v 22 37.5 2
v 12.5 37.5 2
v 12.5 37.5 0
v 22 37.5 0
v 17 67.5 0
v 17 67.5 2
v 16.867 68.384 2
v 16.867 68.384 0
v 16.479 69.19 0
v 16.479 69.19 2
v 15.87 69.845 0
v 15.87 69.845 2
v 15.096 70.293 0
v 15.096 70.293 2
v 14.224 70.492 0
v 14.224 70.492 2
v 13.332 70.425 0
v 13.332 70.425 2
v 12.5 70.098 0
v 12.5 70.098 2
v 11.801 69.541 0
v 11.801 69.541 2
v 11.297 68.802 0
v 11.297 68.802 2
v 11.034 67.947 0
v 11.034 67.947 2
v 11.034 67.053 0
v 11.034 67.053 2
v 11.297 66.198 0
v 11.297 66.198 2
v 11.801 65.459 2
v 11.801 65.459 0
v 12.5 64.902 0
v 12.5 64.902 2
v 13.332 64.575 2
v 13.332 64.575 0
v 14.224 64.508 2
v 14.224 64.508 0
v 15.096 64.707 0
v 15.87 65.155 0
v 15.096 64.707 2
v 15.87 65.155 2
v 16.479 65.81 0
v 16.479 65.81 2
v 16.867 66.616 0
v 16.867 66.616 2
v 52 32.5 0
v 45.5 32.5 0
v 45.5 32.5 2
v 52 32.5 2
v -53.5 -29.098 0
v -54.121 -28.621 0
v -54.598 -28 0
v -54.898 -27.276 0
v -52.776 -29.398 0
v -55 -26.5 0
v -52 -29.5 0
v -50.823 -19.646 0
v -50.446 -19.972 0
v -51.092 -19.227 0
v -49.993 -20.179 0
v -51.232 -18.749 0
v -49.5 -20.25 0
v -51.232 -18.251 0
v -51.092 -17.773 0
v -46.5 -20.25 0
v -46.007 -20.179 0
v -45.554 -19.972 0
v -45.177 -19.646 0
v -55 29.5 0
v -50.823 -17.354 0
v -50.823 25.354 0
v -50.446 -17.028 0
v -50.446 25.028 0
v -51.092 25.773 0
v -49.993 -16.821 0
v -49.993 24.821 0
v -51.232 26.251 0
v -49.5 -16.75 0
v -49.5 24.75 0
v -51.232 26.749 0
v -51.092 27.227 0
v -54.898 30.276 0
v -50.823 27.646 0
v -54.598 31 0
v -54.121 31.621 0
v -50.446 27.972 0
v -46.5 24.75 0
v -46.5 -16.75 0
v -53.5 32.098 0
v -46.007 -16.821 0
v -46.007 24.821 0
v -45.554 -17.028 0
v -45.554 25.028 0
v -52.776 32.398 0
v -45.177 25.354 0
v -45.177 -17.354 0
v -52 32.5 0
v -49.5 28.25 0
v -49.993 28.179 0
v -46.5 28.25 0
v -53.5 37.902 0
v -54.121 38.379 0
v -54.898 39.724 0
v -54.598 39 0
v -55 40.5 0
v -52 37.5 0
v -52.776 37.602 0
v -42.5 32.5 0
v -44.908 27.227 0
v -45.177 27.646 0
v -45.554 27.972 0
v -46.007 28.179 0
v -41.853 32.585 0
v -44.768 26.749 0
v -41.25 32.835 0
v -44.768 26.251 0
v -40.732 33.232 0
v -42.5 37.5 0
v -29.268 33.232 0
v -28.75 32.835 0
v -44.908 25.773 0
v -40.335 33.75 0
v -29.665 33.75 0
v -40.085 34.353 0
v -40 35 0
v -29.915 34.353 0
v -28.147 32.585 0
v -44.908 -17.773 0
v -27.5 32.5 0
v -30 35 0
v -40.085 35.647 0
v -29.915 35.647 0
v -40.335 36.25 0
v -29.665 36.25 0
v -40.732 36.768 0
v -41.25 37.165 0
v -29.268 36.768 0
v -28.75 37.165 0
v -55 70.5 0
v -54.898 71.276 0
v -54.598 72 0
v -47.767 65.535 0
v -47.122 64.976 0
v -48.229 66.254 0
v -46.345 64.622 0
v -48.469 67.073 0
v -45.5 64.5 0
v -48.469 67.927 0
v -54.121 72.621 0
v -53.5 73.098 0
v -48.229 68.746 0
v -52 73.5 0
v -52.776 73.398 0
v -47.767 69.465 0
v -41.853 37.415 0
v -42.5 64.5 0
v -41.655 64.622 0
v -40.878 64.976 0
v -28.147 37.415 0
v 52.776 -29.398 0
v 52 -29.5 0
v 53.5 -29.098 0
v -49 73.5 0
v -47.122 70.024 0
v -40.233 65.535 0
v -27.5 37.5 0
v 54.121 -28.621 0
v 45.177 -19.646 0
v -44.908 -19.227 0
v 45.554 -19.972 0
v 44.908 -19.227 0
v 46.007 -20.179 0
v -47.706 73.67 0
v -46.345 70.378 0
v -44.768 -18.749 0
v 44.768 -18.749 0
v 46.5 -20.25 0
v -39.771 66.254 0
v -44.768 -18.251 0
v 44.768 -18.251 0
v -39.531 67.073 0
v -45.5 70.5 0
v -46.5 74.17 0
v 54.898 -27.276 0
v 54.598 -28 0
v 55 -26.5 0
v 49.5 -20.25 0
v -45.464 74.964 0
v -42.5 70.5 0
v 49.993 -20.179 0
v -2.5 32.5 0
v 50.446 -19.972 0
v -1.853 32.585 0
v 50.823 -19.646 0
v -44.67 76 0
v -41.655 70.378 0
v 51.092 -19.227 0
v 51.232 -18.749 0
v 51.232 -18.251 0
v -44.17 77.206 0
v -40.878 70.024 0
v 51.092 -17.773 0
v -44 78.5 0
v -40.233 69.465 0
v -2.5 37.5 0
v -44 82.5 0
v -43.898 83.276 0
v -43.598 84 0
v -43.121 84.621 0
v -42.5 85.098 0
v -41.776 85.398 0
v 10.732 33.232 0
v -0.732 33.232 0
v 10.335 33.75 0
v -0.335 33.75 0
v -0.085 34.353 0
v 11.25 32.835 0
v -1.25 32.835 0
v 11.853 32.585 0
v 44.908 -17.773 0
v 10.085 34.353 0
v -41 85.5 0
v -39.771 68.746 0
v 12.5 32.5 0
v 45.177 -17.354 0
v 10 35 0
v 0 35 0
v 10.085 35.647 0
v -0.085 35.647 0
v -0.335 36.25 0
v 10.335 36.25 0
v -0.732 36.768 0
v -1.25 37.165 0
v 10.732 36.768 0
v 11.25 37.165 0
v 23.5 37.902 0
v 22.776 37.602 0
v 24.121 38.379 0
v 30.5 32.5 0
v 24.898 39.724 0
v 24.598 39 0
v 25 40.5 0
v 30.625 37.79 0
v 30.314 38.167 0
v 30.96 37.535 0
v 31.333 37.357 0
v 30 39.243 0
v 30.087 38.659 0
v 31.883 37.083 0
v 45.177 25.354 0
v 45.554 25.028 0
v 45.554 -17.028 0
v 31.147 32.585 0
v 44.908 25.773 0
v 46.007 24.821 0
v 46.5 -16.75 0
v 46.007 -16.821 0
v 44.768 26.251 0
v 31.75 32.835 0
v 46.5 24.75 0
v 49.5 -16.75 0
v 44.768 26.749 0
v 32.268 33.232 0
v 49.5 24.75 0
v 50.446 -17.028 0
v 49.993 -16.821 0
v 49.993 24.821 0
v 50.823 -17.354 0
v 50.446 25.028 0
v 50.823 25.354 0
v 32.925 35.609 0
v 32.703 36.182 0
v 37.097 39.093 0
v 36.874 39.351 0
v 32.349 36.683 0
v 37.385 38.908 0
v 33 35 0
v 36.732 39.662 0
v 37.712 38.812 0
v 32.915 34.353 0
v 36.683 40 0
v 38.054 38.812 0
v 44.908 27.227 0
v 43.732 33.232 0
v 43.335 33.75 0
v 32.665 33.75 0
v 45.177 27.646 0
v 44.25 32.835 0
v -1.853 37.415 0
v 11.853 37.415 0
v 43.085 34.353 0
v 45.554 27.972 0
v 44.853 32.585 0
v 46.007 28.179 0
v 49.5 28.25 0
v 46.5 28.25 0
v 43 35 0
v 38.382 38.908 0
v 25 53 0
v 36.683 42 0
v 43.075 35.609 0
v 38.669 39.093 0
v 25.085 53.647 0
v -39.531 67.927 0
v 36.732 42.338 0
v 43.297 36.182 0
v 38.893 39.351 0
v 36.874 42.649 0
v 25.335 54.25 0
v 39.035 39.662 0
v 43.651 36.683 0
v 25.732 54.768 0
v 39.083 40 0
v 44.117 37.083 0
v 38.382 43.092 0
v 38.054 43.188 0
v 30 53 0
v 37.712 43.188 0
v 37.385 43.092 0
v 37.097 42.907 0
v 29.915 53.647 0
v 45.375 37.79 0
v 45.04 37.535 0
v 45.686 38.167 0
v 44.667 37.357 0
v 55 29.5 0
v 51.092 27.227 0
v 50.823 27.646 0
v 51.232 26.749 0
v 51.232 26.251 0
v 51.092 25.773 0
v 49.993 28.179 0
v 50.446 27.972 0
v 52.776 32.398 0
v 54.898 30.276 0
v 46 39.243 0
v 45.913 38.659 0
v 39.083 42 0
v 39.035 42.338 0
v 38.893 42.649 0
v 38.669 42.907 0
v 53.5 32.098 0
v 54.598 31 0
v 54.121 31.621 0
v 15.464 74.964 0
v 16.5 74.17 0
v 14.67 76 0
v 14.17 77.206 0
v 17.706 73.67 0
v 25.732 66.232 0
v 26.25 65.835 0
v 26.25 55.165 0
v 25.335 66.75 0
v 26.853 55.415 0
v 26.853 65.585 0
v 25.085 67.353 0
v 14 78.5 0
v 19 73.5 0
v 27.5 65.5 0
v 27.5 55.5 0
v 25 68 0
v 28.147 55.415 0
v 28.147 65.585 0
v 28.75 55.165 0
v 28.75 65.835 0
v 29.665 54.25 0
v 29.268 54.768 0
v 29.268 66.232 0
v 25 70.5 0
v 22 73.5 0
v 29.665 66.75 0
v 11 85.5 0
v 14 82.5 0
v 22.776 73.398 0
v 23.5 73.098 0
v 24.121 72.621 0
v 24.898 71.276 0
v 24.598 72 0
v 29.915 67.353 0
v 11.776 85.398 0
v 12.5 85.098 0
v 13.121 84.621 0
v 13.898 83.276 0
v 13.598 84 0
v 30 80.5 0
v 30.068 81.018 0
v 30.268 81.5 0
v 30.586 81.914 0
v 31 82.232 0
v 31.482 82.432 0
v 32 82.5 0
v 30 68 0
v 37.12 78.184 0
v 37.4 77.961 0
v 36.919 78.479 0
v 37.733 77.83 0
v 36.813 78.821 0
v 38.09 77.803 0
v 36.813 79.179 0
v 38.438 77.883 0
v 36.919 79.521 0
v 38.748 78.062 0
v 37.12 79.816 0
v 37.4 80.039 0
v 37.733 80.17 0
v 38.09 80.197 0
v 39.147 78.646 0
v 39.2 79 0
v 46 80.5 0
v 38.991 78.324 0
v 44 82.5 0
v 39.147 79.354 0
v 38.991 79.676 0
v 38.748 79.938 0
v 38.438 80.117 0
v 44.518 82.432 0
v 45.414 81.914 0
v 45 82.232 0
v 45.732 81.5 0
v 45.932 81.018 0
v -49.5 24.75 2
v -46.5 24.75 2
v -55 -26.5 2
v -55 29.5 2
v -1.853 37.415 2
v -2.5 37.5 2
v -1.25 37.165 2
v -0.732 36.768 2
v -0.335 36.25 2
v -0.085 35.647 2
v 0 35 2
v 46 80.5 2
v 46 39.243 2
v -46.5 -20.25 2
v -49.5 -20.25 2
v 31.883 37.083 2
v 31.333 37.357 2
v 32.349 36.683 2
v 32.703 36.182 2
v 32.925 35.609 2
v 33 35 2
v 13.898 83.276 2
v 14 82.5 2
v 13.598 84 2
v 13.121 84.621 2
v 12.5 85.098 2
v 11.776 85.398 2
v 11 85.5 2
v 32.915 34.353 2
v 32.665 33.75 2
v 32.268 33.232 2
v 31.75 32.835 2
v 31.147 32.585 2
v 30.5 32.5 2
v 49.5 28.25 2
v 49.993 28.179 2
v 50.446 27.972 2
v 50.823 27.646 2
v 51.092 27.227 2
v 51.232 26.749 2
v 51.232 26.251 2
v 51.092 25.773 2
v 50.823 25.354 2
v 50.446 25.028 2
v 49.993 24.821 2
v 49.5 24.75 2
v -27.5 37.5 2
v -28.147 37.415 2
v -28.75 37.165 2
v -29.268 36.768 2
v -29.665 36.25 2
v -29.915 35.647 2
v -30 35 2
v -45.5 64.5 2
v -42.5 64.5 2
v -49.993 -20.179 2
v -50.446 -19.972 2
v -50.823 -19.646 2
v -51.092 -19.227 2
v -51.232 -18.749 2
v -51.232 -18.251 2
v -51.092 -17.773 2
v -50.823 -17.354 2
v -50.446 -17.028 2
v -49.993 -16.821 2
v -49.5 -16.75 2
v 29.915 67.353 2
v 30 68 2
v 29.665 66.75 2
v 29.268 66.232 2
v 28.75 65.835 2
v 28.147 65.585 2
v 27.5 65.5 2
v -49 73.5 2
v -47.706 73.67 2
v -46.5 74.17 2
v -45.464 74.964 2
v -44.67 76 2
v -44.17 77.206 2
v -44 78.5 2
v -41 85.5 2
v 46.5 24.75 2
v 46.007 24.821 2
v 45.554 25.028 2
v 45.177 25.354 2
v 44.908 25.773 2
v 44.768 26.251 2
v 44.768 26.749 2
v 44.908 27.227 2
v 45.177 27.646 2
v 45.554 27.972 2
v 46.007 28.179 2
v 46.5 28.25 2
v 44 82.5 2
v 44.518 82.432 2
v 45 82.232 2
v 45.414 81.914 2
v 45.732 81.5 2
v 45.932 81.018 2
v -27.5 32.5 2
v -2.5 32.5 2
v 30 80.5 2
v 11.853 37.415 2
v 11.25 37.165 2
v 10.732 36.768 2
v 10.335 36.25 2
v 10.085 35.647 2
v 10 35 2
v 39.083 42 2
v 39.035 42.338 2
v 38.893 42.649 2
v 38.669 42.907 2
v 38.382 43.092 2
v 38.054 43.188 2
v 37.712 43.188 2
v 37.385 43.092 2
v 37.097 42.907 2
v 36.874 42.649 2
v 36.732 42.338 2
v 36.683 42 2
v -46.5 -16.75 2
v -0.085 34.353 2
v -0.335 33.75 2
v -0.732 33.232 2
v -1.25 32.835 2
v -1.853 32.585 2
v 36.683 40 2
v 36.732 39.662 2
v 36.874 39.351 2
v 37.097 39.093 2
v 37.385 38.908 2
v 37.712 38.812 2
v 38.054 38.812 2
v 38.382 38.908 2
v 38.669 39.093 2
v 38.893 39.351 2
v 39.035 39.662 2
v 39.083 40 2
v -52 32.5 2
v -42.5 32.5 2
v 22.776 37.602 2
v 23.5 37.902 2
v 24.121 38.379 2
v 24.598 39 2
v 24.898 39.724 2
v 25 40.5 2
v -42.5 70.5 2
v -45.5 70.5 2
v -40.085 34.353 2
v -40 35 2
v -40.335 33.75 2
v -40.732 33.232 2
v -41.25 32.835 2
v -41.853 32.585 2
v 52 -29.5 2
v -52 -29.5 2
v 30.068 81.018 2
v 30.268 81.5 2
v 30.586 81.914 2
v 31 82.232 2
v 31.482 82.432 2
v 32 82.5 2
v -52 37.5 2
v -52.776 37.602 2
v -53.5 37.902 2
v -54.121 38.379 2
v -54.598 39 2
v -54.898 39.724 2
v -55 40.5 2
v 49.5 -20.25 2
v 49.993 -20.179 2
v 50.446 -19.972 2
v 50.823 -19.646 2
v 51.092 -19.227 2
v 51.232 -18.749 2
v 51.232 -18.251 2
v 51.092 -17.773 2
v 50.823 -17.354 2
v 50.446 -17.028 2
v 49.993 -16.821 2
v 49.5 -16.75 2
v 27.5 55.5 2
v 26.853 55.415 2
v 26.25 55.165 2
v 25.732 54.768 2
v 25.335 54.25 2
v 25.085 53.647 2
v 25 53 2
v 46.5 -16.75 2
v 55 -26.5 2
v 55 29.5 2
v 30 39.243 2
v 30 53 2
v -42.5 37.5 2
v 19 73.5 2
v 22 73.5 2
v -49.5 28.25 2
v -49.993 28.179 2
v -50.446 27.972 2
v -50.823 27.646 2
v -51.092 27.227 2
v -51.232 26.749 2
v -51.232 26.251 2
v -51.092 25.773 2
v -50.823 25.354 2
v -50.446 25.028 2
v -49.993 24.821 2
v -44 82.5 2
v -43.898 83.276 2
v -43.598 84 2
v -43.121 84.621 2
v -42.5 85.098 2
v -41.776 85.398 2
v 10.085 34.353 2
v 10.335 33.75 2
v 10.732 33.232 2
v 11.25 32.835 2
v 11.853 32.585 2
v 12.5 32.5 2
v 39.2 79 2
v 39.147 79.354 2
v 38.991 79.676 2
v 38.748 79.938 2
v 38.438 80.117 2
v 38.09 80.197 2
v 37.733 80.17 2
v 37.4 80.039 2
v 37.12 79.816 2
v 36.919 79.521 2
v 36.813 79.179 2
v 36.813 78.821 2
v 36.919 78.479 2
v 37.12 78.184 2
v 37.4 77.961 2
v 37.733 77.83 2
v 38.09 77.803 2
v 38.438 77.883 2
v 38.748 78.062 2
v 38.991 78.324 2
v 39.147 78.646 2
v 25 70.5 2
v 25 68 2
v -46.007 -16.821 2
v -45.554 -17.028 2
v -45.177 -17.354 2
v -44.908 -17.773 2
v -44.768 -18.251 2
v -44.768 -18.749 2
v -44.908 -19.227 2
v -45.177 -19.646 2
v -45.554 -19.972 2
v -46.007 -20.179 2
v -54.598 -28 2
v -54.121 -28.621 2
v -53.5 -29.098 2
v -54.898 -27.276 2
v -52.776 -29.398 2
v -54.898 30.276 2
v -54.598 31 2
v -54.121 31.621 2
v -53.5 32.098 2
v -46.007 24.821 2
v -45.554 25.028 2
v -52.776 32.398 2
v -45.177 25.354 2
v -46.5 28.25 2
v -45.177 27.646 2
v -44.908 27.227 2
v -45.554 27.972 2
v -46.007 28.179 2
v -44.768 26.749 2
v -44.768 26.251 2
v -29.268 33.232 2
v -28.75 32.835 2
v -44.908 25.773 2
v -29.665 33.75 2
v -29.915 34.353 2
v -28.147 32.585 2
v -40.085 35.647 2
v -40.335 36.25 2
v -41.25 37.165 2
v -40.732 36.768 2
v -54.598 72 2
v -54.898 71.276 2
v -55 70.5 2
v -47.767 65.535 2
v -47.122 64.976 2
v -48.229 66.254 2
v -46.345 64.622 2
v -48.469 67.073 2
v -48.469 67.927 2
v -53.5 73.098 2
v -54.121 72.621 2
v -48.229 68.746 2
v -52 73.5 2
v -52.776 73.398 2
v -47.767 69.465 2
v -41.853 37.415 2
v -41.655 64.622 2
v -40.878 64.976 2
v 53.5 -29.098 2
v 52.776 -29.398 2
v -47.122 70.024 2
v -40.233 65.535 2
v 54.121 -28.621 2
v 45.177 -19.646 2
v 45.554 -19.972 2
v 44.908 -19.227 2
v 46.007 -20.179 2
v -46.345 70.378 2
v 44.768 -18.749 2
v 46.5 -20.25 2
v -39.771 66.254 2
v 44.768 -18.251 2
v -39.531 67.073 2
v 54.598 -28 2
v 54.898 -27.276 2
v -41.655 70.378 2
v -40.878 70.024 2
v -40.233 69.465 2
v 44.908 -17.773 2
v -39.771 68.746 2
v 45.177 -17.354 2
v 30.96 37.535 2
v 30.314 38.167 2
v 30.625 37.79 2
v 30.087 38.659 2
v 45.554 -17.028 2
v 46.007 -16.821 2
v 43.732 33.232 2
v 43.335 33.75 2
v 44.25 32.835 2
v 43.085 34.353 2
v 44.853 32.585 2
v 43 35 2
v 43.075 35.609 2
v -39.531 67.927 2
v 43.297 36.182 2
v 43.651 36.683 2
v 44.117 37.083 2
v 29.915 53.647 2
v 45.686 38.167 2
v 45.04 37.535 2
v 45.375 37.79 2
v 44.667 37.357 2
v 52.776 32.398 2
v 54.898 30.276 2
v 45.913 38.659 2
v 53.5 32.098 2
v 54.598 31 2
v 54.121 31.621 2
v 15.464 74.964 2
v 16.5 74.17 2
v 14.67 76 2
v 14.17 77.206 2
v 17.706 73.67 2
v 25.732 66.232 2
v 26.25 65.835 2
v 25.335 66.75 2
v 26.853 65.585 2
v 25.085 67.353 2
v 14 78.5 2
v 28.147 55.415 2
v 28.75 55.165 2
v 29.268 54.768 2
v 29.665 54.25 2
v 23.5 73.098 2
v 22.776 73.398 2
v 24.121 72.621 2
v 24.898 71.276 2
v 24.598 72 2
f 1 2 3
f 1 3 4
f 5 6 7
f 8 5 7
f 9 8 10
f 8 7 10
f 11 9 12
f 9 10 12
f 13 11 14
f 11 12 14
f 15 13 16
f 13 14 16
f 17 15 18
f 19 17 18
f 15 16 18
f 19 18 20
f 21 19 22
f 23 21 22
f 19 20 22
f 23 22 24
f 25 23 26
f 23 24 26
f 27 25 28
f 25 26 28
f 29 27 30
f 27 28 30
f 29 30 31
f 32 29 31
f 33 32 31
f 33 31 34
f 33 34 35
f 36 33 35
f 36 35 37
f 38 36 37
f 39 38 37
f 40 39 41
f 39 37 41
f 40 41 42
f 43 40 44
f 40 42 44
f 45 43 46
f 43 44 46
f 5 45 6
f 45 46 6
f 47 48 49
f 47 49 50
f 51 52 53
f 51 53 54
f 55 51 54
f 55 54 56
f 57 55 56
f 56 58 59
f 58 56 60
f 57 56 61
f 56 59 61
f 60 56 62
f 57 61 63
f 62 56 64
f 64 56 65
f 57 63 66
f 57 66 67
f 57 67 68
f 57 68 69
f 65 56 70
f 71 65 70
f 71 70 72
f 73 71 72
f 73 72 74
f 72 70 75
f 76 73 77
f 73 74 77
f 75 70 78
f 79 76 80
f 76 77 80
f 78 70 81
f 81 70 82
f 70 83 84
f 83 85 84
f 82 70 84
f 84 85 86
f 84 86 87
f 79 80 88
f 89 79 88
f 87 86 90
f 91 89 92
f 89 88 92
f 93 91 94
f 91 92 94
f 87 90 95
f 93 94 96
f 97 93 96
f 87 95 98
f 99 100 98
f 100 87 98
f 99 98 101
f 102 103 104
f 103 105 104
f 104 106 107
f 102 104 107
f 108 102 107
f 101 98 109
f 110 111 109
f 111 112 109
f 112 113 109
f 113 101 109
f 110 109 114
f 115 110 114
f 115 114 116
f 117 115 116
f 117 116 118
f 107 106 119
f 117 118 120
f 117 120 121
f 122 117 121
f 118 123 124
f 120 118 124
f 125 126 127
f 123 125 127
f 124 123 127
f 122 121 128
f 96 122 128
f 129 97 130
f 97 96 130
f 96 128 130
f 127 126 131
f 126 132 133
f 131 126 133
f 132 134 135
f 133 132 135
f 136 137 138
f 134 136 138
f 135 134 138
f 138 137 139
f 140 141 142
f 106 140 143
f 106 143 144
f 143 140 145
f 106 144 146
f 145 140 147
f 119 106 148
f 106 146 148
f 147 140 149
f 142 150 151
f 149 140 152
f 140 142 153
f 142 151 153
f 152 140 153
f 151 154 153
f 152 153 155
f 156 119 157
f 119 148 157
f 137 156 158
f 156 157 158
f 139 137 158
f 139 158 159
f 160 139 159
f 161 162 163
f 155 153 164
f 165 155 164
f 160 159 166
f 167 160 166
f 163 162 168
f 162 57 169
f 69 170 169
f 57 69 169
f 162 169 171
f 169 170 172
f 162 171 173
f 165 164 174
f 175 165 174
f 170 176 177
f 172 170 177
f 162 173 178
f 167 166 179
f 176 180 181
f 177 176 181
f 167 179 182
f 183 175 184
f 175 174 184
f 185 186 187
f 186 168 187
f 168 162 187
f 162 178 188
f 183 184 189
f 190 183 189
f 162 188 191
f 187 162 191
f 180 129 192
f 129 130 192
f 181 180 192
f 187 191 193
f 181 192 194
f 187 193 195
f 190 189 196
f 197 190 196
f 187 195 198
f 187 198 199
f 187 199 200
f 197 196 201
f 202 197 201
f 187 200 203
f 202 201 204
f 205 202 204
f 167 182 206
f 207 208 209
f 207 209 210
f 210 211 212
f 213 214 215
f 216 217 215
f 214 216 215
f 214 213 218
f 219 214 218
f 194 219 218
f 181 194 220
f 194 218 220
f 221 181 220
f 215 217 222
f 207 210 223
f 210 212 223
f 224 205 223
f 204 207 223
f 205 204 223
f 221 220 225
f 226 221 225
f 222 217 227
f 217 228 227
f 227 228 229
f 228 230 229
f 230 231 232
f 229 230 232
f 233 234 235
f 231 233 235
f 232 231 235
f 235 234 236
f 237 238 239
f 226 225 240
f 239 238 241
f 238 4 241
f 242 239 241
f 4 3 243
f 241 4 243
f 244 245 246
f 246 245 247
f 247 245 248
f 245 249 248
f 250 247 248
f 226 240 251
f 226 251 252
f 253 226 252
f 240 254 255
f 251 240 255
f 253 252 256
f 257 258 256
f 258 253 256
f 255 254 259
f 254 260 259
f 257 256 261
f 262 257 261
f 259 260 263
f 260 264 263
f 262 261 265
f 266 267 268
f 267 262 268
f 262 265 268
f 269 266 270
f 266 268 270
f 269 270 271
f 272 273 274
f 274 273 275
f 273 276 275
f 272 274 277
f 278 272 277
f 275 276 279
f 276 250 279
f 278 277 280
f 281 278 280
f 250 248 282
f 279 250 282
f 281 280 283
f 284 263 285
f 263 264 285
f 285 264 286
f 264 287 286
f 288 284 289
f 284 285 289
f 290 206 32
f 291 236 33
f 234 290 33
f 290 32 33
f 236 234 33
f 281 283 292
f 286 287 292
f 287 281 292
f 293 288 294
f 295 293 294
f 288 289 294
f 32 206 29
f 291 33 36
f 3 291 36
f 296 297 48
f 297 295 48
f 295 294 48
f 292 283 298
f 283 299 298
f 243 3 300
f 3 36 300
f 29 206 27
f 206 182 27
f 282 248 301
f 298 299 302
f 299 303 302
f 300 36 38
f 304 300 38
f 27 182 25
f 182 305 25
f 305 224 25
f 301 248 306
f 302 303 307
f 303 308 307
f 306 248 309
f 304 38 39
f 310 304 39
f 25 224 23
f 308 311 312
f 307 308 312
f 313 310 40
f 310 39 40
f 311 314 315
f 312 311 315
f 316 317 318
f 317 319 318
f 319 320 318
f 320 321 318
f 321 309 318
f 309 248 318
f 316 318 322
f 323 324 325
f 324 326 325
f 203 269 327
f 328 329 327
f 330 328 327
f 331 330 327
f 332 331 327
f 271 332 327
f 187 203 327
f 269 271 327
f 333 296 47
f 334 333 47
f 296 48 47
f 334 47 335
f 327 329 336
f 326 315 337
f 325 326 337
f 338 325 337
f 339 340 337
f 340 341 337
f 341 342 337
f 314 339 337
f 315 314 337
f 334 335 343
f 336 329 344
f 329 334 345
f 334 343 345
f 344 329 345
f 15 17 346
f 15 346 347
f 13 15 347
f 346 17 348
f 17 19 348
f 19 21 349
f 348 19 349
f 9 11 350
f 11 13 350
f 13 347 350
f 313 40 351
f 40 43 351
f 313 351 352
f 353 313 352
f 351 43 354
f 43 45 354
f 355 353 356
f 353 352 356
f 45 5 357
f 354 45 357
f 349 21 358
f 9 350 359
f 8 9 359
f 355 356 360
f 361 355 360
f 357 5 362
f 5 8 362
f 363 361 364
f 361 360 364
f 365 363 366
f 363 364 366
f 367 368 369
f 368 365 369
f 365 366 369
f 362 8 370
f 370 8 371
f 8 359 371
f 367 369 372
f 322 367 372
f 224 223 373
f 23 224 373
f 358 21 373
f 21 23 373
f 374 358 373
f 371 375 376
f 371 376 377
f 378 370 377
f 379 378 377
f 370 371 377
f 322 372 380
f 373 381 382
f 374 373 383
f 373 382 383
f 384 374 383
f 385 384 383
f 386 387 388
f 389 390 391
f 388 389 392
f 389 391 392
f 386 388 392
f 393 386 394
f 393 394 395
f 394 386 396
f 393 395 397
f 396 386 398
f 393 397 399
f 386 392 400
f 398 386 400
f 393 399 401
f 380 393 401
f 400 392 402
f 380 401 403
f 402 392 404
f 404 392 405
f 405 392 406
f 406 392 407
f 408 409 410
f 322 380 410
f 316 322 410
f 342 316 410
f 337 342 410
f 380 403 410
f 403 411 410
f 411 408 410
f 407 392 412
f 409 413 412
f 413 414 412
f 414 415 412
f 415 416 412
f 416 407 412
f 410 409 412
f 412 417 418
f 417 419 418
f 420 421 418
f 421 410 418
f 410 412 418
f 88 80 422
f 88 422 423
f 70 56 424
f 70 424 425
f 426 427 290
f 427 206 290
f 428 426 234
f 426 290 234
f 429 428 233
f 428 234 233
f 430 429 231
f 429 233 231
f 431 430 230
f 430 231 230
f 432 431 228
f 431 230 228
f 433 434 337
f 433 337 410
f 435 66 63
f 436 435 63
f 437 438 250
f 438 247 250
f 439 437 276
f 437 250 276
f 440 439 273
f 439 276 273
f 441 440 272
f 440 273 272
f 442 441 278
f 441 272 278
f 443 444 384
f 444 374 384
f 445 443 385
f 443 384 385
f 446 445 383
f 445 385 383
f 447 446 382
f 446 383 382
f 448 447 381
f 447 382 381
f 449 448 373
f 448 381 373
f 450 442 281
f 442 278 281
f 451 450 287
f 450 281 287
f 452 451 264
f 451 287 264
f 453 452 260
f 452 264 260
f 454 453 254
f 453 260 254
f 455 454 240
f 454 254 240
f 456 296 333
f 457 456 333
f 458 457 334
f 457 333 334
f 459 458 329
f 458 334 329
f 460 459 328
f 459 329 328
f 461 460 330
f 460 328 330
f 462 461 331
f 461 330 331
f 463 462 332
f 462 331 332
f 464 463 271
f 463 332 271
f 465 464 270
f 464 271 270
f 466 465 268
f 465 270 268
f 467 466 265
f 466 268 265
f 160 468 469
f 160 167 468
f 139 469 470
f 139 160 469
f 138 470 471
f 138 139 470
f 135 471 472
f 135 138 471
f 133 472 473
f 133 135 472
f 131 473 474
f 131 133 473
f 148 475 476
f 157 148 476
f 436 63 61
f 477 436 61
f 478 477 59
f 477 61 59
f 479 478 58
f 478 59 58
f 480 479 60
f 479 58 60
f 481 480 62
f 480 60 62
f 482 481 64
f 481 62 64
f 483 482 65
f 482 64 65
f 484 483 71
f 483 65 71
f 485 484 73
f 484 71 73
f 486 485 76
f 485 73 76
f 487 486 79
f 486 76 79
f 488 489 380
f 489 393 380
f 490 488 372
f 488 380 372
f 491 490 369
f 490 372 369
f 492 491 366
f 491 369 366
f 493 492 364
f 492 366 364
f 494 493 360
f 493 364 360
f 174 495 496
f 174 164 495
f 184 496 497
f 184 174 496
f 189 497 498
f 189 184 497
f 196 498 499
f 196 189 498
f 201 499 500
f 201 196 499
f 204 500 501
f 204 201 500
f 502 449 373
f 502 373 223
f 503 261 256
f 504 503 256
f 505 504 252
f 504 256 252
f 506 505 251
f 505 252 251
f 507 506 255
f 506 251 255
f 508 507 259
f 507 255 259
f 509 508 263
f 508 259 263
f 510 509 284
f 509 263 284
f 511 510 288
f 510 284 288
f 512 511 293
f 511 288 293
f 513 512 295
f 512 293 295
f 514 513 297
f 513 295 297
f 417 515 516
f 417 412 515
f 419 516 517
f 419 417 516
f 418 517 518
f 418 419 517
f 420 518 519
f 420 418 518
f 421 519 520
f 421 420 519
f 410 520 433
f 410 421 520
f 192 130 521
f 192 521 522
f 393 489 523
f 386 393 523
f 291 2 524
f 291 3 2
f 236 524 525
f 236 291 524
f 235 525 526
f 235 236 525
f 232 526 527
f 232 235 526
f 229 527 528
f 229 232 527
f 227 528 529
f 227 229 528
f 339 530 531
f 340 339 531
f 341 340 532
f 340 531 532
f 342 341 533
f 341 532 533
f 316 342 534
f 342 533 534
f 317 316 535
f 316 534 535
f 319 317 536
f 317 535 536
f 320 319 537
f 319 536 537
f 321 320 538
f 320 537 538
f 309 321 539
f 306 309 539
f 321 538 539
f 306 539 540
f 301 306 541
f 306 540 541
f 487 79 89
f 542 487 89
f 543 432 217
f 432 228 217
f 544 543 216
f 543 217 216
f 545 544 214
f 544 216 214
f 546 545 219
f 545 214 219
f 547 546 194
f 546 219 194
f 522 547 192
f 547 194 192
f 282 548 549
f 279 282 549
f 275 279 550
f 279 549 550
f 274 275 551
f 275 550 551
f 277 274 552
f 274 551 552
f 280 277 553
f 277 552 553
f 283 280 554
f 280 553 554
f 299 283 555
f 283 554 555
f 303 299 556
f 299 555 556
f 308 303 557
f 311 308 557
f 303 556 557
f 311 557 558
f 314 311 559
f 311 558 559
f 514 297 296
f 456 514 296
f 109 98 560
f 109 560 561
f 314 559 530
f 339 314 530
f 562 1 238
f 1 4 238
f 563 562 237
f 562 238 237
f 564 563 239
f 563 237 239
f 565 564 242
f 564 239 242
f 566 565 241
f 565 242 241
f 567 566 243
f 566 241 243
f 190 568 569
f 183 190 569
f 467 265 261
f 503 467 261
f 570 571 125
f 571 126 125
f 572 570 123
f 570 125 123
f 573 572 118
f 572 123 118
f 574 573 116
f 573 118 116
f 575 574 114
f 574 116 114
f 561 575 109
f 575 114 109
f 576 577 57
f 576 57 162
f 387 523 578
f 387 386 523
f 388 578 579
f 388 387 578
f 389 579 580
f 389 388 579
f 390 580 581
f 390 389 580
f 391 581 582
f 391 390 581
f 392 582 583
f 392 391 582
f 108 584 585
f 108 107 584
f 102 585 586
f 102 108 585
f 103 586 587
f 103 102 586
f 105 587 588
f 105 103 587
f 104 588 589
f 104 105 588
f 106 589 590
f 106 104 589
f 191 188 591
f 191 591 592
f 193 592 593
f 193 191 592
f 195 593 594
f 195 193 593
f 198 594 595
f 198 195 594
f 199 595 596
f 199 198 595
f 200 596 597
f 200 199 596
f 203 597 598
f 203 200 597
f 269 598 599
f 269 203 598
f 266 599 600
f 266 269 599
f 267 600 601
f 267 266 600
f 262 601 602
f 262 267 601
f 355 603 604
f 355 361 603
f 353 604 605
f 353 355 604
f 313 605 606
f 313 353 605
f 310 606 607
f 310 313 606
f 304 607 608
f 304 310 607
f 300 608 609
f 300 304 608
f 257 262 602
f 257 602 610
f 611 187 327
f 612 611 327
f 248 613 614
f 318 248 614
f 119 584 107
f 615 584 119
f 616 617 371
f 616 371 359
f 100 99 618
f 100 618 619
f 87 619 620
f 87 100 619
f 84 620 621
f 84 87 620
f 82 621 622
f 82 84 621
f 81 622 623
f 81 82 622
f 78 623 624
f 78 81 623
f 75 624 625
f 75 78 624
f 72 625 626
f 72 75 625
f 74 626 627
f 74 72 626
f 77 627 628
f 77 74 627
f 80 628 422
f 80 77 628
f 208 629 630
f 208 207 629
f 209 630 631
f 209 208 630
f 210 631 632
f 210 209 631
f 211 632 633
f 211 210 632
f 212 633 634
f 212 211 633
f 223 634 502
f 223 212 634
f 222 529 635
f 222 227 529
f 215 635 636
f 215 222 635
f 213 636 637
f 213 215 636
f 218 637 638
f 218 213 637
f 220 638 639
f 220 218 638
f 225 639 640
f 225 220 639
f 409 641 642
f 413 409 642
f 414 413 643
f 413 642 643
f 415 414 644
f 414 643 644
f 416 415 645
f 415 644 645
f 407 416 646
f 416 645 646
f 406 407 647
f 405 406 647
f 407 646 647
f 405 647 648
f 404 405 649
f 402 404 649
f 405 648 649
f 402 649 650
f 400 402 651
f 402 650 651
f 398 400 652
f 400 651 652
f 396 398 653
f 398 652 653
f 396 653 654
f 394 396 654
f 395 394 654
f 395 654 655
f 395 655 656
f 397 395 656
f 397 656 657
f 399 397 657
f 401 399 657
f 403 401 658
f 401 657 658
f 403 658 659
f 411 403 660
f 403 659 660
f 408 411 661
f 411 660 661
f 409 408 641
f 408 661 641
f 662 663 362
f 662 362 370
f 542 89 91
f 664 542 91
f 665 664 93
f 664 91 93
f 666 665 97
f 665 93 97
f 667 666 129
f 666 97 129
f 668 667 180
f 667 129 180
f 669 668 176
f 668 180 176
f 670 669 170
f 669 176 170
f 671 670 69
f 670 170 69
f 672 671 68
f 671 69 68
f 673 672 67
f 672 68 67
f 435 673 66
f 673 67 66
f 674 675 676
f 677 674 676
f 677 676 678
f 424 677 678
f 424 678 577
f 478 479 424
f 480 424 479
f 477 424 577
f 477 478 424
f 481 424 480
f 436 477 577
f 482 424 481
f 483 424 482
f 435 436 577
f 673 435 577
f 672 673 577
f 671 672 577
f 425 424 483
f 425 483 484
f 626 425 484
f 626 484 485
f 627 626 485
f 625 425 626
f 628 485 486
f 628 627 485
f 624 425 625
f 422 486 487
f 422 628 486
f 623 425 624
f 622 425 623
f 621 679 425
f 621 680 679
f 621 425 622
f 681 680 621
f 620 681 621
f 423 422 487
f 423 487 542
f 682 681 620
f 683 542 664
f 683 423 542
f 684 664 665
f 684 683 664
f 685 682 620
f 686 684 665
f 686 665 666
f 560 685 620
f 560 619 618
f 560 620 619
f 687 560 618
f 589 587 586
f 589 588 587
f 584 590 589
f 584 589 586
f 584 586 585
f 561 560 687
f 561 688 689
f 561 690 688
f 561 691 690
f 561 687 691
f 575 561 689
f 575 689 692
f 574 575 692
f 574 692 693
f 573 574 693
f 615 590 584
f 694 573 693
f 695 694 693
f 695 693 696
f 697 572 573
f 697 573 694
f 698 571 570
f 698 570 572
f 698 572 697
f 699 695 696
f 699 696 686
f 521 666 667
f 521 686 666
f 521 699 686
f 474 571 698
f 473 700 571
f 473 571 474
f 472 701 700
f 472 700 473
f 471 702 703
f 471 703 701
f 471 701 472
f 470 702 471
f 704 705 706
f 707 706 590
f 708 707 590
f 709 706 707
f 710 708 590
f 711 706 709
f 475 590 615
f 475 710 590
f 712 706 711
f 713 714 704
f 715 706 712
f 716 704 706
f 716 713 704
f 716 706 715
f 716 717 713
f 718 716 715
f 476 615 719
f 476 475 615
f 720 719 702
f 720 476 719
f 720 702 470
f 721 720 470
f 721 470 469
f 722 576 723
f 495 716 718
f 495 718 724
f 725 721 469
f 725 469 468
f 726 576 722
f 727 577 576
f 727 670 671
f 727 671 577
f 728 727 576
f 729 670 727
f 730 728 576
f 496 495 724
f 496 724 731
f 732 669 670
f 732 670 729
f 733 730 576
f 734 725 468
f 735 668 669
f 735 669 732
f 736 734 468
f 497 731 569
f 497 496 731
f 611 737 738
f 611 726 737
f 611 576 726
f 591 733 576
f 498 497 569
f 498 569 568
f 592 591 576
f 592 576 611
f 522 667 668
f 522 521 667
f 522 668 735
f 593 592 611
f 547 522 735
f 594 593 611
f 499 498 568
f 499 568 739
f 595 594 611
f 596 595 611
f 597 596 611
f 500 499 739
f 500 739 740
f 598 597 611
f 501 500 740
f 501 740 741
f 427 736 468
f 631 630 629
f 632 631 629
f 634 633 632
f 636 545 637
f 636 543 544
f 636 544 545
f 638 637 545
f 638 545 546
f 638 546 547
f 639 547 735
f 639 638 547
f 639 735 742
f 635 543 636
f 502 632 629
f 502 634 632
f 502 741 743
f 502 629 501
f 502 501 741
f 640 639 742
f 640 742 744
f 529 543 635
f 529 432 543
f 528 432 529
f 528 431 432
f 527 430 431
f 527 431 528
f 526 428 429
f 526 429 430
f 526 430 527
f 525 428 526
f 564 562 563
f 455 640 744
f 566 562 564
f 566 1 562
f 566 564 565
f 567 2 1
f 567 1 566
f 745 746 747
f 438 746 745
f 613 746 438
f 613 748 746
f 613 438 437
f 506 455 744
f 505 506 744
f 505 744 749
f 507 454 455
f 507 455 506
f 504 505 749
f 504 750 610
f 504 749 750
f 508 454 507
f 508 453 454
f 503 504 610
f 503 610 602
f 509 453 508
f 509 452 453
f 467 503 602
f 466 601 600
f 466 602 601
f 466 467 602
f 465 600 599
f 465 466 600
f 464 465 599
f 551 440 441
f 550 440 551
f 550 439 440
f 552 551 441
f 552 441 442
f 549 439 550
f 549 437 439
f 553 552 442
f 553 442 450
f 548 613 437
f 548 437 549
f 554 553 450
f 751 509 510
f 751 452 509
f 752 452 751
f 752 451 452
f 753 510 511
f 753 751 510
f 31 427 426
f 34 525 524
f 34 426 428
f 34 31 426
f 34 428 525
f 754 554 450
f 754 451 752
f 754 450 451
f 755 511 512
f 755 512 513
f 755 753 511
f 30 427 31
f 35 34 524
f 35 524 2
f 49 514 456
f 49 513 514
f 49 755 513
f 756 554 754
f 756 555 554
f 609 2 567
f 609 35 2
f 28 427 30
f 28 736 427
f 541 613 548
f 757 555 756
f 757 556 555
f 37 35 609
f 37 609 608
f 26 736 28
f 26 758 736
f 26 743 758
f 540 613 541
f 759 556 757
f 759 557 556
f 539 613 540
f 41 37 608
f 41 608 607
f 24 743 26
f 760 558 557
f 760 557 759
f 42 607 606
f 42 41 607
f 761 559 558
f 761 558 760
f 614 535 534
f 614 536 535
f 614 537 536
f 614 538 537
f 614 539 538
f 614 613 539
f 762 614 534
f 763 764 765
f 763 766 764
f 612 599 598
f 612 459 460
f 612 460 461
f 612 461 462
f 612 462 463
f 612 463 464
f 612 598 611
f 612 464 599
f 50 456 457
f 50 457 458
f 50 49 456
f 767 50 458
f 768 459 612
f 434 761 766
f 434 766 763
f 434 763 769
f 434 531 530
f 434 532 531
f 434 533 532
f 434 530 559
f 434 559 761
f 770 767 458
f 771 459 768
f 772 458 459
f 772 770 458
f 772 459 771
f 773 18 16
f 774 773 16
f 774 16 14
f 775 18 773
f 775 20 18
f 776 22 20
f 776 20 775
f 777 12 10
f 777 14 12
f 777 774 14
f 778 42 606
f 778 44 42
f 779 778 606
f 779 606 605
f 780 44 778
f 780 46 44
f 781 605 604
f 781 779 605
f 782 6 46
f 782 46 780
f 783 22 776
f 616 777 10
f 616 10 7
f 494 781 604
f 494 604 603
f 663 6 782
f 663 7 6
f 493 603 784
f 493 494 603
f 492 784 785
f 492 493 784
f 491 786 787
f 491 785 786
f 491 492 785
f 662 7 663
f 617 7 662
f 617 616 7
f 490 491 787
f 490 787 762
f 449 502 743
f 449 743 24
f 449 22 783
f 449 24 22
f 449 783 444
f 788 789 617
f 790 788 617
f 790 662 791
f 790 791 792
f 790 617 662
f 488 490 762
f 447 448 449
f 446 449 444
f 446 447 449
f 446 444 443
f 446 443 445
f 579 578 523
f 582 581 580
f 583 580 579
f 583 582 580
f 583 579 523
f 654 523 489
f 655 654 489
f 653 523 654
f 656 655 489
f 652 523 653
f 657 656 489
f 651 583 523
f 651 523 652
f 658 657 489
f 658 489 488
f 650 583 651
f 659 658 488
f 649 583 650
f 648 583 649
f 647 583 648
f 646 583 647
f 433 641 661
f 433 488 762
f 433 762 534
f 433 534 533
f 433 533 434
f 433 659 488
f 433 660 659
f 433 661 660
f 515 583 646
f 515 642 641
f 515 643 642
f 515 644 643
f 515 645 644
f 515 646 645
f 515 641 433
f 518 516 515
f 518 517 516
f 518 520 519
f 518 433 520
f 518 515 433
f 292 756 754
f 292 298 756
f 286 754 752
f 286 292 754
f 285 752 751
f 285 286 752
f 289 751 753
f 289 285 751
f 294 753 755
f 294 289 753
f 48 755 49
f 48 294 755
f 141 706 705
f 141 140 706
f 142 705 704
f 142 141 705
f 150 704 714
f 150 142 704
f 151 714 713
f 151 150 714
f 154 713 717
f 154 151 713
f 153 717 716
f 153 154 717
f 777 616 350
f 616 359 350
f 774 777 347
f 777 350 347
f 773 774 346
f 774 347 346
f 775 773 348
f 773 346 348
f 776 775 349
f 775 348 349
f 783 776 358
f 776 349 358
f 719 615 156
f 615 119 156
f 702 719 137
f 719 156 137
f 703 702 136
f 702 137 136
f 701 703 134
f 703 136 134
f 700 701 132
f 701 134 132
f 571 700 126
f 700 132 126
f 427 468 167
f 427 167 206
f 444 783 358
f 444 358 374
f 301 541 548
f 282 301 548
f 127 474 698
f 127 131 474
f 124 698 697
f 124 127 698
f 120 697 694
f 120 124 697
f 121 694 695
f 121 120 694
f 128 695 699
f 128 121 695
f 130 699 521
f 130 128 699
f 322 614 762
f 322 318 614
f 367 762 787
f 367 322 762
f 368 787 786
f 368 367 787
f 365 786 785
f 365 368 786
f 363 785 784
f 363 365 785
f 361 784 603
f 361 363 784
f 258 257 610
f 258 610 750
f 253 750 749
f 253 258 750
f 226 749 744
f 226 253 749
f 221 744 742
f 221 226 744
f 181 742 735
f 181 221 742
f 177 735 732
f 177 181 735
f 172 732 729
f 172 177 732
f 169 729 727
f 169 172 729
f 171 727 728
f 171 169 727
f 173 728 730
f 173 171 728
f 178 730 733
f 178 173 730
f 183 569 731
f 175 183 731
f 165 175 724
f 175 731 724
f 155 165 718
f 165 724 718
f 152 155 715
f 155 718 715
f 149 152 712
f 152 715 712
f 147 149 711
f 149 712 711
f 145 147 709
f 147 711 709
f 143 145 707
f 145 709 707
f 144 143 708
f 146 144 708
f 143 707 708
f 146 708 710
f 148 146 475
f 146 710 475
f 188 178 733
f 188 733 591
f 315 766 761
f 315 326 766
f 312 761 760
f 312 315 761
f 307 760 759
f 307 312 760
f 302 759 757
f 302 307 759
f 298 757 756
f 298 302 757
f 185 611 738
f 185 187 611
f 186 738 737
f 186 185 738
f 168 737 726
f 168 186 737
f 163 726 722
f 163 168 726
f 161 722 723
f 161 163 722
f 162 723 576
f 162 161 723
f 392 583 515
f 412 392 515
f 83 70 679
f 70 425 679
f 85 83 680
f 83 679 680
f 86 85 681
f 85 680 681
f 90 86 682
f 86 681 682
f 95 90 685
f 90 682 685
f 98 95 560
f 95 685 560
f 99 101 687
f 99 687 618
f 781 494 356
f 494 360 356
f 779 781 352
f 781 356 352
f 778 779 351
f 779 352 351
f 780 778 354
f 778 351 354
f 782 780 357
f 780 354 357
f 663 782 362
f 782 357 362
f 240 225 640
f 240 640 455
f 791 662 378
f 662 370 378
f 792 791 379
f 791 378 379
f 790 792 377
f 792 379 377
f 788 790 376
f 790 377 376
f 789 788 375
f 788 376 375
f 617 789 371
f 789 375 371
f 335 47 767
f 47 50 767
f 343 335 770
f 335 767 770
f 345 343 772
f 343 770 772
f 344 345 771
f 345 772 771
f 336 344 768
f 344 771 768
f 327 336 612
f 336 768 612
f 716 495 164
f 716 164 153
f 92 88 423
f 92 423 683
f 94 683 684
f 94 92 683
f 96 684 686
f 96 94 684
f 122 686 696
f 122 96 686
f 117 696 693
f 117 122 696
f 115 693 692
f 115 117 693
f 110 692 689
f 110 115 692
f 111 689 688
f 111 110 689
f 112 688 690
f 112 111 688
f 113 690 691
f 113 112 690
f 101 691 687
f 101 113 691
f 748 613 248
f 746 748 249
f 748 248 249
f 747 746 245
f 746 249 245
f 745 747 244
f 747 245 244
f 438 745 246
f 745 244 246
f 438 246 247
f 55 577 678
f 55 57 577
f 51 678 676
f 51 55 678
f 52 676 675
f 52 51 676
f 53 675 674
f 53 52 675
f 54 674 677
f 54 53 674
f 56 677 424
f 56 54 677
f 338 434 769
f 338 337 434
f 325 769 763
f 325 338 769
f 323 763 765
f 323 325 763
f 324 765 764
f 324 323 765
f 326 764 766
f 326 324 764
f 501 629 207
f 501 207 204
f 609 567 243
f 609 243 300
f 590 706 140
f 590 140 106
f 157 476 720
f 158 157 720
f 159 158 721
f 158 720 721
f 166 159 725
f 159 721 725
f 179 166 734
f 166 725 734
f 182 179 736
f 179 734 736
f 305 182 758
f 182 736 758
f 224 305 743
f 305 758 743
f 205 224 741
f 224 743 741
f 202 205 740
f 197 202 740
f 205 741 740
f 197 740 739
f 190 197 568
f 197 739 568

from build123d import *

# Parameters (mm, degrees)
SKETCH_1_W          = 110
SKETCH_1_H          = 65
EXTRUDE_1_DEPTH     = 2
FILLET_1_R          = 3
SKETCH_2_R          = 3
EXTRUDE_2_DEPTH     = 2
FILLET_5_R          = 3
FILLET_6_R          = 5
SKETCH_4_W          = 10
SKETCH_4_H          = 5
EXTRUDE_4_DEPTH     = 2
FILLET_7_R          = 2.5
SKETCH_5_W          = 16
SKETCH_5_H          = 45
SKETCH_5_R          = 1.2
EXTRUDE_5_DEPTH     = 2
SKETCH_6_W          = 10
SKETCH_6_H          = 5
SKETCH_6_W_2        = 5
SKETCH_6_H_2        = 10
EXTRUDE_6_DEPTH     = 2
FILLET_8_R          = 2.5
FILLET_9_R          = 2
SKETCH_7_W          = 110
SKETCH_7_H          = 3
CUT_EXTRUDE_1_DEPTH = 10
FILLET_10_R         = 3


with BuildPart() as part:
    # ｽｹｯﾁ1 → ﾎﾞｽ - 押し出し1 (new body)
    with BuildSketch(Plane.XY):
        Rectangle(SKETCH_1_W, SKETCH_1_H)
        with BuildLine():
            Line((-49.5, 24.75), (-46.5, 24.75))
            ThreePointArc((-46.5, 24.75), (-44.75, 26.5), (-46.5, 28.25))
            Line((-46.5, 28.25), (-49.5, 28.25))
            ThreePointArc((-49.5, 28.25), (-51.25, 26.5), (-49.5, 24.75))
        make_face(mode=Mode.SUBTRACT)
        with BuildLine():
            Line((-46.5, -20.25), (-49.5, -20.25))
            ThreePointArc((-49.5, -20.25), (-51.25, -18.5), (-49.5, -16.75))
            Line((-49.5, -16.75), (-46.5, -16.75))
            ThreePointArc((-46.5, -16.75), (-44.75, -18.5), (-46.5, -20.25))
        make_face(mode=Mode.SUBTRACT)
        with BuildLine():
            Line((46.5, -20.25), (49.5, -20.25))
            ThreePointArc((49.5, -20.25), (51.25, -18.5), (49.5, -16.75))
            Line((49.5, -16.75), (46.5, -16.75))
            ThreePointArc((46.5, -16.75), (44.75, -18.5), (46.5, -20.25))
        make_face(mode=Mode.SUBTRACT)
        with BuildLine():
            Line((46.5, 28.25), (49.5, 28.25))
            ThreePointArc((49.5, 28.25), (51.25, 26.5), (49.5, 24.75))
            Line((49.5, 24.75), (46.5, 24.75))
            ThreePointArc((46.5, 24.75), (44.75, 26.5), (46.5, 28.25))
        make_face(mode=Mode.SUBTRACT)
    extrude(amount=EXTRUDE_1_DEPTH)

    # ﾌｨﾚｯﾄ1
    fillet_1_edges = [part.edges().sort_by_distance(p)[0] for p in [
        (-55, 32.5, 1),
        (55, 32.5, 1),
    ]]
    fillet(fillet_1_edges, radius=FILLET_1_R)



with BuildPart() as body_2:
    # ｽｹｯﾁ2 → ﾎﾞｽ - 押し出し2 (new body)
    with BuildSketch(Plane.XY.offset(2)):
        Polygon((-55, 37.5), (25, 37.5), (25, 73.5), (14, 73.5), (14, 85.5), (-44, 85.5), (-44, 73.5), (-55, 73.5), align=None)
        with Locations((14, 67.5)):
            Circle(SKETCH_2_R, mode=Mode.SUBTRACT)
        with BuildLine():
            Line((-45.5, 64.5), (-42.5, 64.5))
            ThreePointArc((-42.5, 64.5), (-39.5, 67.5), (-42.5, 70.5))
            Line((-42.5, 70.5), (-45.5, 70.5))
            ThreePointArc((-45.5, 70.5), (-48.5, 67.5), (-45.5, 64.5))
        make_face(mode=Mode.SUBTRACT)
    extrude(amount=-EXTRUDE_2_DEPTH)

    # ﾌｨﾚｯﾄ5
    fillet_5_edges = [body_2.edges().sort_by_distance(p)[0] for p in [
        (25, 37.5, 1),
        (-55, 37.5, 1),
        (-55, 73.5, 1),
        (-44, 85.5, 1),
        (14, 85.5, 1),
        (25, 73.5, 1),
    ]]
    fillet(fillet_5_edges, radius=FILLET_5_R)

    # ﾌｨﾚｯﾄ6
    fillet_6_edges = [body_2.edges().sort_by_distance(p)[0] for p in [
        (-44, 73.5, 1),
        (14, 73.5, 1),
    ]]
    fillet(fillet_6_edges, radius=FILLET_6_R)


with BuildPart() as part_1:
    add(part.part)

    add(body_2.part)  # ﾎﾞｽ - 押し出し4 merges body 2
    # ｽｹｯﾁ4 → ﾎﾞｽ - 押し出し4 (add)
    with BuildSketch(Plane.XY.offset(2)):
        with Locations((-35, 35)):
            Rectangle(SKETCH_4_W, SKETCH_4_H)
        with Locations((5, 35)):
            Rectangle(SKETCH_4_W, SKETCH_4_H)
    extrude(amount=-EXTRUDE_4_DEPTH)

    # ﾌｨﾚｯﾄ7
    fillet_7_edges = [part_1.edges().sort_by_distance(p)[0] for p in [
        (10, 37.5, 1),
        (10, 32.5, 1),
        (0, 37.5, 1),
        (0, 32.5, 1),
        (-30, 37.5, 1),
        (-30, 32.5, 1),
        (-40, 37.5, 1),
        (-40, 32.5, 1),
    ]]
    fillet(fillet_7_edges, radius=FILLET_7_R - 0.0001)  # a hair under: the kernel refuses the full size



with BuildPart() as body_2_2:
    # ｽｹｯﾁ5 → ﾎﾞｽ - 押し出し5 (new body)
    with BuildSketch(Plane.XY.offset(2)):
        with Locations((38, 60)):
            Rectangle(SKETCH_5_W, SKETCH_5_H)
        with Locations((38, 79)):
            Circle(SKETCH_5_R, mode=Mode.SUBTRACT)
        with BuildLine():
            Line((36.683223365, 42), (36.683223365, 40))
            ThreePointArc((36.683223365, 40), (37.883223365, 38.8), (39.083223365, 40))
            Line((39.083223365, 40), (39.083223365, 42))
            ThreePointArc((39.083223365, 42), (37.883223365, 43.2), (36.683223365, 42))
        make_face(mode=Mode.SUBTRACT)
    extrude(amount=-EXTRUDE_5_DEPTH)


with BuildPart() as part_2:
    add(part_1.part)

    add(body_2_2.part)  # ﾎﾞｽ - 押し出し6 merges body 2 2
    # ｽｹｯﾁ6 → ﾎﾞｽ - 押し出し6 (add)
    with BuildSketch(Plane.XY.offset(2)):
        with Locations((38, 35)):
            Rectangle(SKETCH_6_W, SKETCH_6_H)
        with Locations((27.5, 60.5)):
            Rectangle(SKETCH_6_W_2, SKETCH_6_H_2)
    extrude(amount=-EXTRUDE_6_DEPTH)

    # ﾌｨﾚｯﾄ8
    fillet_8_edges = [part_2.edges().sort_by_distance(p)[0] for p in [
        (43, 32.5, 1),
        (43, 37.5, 1),
        (33, 32.5, 1),
        (33, 37.5, 1),
        (30, 55.5, 1),
        (25, 55.5, 1),
        (25, 65.5, 1),
        (30, 65.5, 1),
    ]]
    fillet(fillet_8_edges, radius=FILLET_8_R - 0.0001)  # a hair under: the kernel refuses the full size

    # ﾌｨﾚｯﾄ9
    fillet_9_edges = [part_2.edges().sort_by_distance(p)[0] for p in [
        (46, 82.5, 1),
        (30, 82.5, 1),
        (46, 37.5, 1),
        (30, 37.5, 1),
    ]]
    fillet(fillet_9_edges, radius=FILLET_9_R)

    # ｽｹｯﾁ7 → ｶｯﾄ - 押し出し1 (cut)
    with BuildSketch(Plane.XY.offset(2)):
        with Locations((0, -31)):
            Rectangle(SKETCH_7_W, SKETCH_7_H)
    extrude(amount=-CUT_EXTRUDE_1_DEPTH, mode=Mode.SUBTRACT)

    # ﾌｨﾚｯﾄ10
    fillet_10_edges = [part_2.edges().sort_by_distance(p)[0] for p in [
        (55, -29.5, 1),
        (-55, -29.5, 1),
    ]]
    fillet(fillet_10_edges, radius=FILLET_10_R)


solid = part_2.part
